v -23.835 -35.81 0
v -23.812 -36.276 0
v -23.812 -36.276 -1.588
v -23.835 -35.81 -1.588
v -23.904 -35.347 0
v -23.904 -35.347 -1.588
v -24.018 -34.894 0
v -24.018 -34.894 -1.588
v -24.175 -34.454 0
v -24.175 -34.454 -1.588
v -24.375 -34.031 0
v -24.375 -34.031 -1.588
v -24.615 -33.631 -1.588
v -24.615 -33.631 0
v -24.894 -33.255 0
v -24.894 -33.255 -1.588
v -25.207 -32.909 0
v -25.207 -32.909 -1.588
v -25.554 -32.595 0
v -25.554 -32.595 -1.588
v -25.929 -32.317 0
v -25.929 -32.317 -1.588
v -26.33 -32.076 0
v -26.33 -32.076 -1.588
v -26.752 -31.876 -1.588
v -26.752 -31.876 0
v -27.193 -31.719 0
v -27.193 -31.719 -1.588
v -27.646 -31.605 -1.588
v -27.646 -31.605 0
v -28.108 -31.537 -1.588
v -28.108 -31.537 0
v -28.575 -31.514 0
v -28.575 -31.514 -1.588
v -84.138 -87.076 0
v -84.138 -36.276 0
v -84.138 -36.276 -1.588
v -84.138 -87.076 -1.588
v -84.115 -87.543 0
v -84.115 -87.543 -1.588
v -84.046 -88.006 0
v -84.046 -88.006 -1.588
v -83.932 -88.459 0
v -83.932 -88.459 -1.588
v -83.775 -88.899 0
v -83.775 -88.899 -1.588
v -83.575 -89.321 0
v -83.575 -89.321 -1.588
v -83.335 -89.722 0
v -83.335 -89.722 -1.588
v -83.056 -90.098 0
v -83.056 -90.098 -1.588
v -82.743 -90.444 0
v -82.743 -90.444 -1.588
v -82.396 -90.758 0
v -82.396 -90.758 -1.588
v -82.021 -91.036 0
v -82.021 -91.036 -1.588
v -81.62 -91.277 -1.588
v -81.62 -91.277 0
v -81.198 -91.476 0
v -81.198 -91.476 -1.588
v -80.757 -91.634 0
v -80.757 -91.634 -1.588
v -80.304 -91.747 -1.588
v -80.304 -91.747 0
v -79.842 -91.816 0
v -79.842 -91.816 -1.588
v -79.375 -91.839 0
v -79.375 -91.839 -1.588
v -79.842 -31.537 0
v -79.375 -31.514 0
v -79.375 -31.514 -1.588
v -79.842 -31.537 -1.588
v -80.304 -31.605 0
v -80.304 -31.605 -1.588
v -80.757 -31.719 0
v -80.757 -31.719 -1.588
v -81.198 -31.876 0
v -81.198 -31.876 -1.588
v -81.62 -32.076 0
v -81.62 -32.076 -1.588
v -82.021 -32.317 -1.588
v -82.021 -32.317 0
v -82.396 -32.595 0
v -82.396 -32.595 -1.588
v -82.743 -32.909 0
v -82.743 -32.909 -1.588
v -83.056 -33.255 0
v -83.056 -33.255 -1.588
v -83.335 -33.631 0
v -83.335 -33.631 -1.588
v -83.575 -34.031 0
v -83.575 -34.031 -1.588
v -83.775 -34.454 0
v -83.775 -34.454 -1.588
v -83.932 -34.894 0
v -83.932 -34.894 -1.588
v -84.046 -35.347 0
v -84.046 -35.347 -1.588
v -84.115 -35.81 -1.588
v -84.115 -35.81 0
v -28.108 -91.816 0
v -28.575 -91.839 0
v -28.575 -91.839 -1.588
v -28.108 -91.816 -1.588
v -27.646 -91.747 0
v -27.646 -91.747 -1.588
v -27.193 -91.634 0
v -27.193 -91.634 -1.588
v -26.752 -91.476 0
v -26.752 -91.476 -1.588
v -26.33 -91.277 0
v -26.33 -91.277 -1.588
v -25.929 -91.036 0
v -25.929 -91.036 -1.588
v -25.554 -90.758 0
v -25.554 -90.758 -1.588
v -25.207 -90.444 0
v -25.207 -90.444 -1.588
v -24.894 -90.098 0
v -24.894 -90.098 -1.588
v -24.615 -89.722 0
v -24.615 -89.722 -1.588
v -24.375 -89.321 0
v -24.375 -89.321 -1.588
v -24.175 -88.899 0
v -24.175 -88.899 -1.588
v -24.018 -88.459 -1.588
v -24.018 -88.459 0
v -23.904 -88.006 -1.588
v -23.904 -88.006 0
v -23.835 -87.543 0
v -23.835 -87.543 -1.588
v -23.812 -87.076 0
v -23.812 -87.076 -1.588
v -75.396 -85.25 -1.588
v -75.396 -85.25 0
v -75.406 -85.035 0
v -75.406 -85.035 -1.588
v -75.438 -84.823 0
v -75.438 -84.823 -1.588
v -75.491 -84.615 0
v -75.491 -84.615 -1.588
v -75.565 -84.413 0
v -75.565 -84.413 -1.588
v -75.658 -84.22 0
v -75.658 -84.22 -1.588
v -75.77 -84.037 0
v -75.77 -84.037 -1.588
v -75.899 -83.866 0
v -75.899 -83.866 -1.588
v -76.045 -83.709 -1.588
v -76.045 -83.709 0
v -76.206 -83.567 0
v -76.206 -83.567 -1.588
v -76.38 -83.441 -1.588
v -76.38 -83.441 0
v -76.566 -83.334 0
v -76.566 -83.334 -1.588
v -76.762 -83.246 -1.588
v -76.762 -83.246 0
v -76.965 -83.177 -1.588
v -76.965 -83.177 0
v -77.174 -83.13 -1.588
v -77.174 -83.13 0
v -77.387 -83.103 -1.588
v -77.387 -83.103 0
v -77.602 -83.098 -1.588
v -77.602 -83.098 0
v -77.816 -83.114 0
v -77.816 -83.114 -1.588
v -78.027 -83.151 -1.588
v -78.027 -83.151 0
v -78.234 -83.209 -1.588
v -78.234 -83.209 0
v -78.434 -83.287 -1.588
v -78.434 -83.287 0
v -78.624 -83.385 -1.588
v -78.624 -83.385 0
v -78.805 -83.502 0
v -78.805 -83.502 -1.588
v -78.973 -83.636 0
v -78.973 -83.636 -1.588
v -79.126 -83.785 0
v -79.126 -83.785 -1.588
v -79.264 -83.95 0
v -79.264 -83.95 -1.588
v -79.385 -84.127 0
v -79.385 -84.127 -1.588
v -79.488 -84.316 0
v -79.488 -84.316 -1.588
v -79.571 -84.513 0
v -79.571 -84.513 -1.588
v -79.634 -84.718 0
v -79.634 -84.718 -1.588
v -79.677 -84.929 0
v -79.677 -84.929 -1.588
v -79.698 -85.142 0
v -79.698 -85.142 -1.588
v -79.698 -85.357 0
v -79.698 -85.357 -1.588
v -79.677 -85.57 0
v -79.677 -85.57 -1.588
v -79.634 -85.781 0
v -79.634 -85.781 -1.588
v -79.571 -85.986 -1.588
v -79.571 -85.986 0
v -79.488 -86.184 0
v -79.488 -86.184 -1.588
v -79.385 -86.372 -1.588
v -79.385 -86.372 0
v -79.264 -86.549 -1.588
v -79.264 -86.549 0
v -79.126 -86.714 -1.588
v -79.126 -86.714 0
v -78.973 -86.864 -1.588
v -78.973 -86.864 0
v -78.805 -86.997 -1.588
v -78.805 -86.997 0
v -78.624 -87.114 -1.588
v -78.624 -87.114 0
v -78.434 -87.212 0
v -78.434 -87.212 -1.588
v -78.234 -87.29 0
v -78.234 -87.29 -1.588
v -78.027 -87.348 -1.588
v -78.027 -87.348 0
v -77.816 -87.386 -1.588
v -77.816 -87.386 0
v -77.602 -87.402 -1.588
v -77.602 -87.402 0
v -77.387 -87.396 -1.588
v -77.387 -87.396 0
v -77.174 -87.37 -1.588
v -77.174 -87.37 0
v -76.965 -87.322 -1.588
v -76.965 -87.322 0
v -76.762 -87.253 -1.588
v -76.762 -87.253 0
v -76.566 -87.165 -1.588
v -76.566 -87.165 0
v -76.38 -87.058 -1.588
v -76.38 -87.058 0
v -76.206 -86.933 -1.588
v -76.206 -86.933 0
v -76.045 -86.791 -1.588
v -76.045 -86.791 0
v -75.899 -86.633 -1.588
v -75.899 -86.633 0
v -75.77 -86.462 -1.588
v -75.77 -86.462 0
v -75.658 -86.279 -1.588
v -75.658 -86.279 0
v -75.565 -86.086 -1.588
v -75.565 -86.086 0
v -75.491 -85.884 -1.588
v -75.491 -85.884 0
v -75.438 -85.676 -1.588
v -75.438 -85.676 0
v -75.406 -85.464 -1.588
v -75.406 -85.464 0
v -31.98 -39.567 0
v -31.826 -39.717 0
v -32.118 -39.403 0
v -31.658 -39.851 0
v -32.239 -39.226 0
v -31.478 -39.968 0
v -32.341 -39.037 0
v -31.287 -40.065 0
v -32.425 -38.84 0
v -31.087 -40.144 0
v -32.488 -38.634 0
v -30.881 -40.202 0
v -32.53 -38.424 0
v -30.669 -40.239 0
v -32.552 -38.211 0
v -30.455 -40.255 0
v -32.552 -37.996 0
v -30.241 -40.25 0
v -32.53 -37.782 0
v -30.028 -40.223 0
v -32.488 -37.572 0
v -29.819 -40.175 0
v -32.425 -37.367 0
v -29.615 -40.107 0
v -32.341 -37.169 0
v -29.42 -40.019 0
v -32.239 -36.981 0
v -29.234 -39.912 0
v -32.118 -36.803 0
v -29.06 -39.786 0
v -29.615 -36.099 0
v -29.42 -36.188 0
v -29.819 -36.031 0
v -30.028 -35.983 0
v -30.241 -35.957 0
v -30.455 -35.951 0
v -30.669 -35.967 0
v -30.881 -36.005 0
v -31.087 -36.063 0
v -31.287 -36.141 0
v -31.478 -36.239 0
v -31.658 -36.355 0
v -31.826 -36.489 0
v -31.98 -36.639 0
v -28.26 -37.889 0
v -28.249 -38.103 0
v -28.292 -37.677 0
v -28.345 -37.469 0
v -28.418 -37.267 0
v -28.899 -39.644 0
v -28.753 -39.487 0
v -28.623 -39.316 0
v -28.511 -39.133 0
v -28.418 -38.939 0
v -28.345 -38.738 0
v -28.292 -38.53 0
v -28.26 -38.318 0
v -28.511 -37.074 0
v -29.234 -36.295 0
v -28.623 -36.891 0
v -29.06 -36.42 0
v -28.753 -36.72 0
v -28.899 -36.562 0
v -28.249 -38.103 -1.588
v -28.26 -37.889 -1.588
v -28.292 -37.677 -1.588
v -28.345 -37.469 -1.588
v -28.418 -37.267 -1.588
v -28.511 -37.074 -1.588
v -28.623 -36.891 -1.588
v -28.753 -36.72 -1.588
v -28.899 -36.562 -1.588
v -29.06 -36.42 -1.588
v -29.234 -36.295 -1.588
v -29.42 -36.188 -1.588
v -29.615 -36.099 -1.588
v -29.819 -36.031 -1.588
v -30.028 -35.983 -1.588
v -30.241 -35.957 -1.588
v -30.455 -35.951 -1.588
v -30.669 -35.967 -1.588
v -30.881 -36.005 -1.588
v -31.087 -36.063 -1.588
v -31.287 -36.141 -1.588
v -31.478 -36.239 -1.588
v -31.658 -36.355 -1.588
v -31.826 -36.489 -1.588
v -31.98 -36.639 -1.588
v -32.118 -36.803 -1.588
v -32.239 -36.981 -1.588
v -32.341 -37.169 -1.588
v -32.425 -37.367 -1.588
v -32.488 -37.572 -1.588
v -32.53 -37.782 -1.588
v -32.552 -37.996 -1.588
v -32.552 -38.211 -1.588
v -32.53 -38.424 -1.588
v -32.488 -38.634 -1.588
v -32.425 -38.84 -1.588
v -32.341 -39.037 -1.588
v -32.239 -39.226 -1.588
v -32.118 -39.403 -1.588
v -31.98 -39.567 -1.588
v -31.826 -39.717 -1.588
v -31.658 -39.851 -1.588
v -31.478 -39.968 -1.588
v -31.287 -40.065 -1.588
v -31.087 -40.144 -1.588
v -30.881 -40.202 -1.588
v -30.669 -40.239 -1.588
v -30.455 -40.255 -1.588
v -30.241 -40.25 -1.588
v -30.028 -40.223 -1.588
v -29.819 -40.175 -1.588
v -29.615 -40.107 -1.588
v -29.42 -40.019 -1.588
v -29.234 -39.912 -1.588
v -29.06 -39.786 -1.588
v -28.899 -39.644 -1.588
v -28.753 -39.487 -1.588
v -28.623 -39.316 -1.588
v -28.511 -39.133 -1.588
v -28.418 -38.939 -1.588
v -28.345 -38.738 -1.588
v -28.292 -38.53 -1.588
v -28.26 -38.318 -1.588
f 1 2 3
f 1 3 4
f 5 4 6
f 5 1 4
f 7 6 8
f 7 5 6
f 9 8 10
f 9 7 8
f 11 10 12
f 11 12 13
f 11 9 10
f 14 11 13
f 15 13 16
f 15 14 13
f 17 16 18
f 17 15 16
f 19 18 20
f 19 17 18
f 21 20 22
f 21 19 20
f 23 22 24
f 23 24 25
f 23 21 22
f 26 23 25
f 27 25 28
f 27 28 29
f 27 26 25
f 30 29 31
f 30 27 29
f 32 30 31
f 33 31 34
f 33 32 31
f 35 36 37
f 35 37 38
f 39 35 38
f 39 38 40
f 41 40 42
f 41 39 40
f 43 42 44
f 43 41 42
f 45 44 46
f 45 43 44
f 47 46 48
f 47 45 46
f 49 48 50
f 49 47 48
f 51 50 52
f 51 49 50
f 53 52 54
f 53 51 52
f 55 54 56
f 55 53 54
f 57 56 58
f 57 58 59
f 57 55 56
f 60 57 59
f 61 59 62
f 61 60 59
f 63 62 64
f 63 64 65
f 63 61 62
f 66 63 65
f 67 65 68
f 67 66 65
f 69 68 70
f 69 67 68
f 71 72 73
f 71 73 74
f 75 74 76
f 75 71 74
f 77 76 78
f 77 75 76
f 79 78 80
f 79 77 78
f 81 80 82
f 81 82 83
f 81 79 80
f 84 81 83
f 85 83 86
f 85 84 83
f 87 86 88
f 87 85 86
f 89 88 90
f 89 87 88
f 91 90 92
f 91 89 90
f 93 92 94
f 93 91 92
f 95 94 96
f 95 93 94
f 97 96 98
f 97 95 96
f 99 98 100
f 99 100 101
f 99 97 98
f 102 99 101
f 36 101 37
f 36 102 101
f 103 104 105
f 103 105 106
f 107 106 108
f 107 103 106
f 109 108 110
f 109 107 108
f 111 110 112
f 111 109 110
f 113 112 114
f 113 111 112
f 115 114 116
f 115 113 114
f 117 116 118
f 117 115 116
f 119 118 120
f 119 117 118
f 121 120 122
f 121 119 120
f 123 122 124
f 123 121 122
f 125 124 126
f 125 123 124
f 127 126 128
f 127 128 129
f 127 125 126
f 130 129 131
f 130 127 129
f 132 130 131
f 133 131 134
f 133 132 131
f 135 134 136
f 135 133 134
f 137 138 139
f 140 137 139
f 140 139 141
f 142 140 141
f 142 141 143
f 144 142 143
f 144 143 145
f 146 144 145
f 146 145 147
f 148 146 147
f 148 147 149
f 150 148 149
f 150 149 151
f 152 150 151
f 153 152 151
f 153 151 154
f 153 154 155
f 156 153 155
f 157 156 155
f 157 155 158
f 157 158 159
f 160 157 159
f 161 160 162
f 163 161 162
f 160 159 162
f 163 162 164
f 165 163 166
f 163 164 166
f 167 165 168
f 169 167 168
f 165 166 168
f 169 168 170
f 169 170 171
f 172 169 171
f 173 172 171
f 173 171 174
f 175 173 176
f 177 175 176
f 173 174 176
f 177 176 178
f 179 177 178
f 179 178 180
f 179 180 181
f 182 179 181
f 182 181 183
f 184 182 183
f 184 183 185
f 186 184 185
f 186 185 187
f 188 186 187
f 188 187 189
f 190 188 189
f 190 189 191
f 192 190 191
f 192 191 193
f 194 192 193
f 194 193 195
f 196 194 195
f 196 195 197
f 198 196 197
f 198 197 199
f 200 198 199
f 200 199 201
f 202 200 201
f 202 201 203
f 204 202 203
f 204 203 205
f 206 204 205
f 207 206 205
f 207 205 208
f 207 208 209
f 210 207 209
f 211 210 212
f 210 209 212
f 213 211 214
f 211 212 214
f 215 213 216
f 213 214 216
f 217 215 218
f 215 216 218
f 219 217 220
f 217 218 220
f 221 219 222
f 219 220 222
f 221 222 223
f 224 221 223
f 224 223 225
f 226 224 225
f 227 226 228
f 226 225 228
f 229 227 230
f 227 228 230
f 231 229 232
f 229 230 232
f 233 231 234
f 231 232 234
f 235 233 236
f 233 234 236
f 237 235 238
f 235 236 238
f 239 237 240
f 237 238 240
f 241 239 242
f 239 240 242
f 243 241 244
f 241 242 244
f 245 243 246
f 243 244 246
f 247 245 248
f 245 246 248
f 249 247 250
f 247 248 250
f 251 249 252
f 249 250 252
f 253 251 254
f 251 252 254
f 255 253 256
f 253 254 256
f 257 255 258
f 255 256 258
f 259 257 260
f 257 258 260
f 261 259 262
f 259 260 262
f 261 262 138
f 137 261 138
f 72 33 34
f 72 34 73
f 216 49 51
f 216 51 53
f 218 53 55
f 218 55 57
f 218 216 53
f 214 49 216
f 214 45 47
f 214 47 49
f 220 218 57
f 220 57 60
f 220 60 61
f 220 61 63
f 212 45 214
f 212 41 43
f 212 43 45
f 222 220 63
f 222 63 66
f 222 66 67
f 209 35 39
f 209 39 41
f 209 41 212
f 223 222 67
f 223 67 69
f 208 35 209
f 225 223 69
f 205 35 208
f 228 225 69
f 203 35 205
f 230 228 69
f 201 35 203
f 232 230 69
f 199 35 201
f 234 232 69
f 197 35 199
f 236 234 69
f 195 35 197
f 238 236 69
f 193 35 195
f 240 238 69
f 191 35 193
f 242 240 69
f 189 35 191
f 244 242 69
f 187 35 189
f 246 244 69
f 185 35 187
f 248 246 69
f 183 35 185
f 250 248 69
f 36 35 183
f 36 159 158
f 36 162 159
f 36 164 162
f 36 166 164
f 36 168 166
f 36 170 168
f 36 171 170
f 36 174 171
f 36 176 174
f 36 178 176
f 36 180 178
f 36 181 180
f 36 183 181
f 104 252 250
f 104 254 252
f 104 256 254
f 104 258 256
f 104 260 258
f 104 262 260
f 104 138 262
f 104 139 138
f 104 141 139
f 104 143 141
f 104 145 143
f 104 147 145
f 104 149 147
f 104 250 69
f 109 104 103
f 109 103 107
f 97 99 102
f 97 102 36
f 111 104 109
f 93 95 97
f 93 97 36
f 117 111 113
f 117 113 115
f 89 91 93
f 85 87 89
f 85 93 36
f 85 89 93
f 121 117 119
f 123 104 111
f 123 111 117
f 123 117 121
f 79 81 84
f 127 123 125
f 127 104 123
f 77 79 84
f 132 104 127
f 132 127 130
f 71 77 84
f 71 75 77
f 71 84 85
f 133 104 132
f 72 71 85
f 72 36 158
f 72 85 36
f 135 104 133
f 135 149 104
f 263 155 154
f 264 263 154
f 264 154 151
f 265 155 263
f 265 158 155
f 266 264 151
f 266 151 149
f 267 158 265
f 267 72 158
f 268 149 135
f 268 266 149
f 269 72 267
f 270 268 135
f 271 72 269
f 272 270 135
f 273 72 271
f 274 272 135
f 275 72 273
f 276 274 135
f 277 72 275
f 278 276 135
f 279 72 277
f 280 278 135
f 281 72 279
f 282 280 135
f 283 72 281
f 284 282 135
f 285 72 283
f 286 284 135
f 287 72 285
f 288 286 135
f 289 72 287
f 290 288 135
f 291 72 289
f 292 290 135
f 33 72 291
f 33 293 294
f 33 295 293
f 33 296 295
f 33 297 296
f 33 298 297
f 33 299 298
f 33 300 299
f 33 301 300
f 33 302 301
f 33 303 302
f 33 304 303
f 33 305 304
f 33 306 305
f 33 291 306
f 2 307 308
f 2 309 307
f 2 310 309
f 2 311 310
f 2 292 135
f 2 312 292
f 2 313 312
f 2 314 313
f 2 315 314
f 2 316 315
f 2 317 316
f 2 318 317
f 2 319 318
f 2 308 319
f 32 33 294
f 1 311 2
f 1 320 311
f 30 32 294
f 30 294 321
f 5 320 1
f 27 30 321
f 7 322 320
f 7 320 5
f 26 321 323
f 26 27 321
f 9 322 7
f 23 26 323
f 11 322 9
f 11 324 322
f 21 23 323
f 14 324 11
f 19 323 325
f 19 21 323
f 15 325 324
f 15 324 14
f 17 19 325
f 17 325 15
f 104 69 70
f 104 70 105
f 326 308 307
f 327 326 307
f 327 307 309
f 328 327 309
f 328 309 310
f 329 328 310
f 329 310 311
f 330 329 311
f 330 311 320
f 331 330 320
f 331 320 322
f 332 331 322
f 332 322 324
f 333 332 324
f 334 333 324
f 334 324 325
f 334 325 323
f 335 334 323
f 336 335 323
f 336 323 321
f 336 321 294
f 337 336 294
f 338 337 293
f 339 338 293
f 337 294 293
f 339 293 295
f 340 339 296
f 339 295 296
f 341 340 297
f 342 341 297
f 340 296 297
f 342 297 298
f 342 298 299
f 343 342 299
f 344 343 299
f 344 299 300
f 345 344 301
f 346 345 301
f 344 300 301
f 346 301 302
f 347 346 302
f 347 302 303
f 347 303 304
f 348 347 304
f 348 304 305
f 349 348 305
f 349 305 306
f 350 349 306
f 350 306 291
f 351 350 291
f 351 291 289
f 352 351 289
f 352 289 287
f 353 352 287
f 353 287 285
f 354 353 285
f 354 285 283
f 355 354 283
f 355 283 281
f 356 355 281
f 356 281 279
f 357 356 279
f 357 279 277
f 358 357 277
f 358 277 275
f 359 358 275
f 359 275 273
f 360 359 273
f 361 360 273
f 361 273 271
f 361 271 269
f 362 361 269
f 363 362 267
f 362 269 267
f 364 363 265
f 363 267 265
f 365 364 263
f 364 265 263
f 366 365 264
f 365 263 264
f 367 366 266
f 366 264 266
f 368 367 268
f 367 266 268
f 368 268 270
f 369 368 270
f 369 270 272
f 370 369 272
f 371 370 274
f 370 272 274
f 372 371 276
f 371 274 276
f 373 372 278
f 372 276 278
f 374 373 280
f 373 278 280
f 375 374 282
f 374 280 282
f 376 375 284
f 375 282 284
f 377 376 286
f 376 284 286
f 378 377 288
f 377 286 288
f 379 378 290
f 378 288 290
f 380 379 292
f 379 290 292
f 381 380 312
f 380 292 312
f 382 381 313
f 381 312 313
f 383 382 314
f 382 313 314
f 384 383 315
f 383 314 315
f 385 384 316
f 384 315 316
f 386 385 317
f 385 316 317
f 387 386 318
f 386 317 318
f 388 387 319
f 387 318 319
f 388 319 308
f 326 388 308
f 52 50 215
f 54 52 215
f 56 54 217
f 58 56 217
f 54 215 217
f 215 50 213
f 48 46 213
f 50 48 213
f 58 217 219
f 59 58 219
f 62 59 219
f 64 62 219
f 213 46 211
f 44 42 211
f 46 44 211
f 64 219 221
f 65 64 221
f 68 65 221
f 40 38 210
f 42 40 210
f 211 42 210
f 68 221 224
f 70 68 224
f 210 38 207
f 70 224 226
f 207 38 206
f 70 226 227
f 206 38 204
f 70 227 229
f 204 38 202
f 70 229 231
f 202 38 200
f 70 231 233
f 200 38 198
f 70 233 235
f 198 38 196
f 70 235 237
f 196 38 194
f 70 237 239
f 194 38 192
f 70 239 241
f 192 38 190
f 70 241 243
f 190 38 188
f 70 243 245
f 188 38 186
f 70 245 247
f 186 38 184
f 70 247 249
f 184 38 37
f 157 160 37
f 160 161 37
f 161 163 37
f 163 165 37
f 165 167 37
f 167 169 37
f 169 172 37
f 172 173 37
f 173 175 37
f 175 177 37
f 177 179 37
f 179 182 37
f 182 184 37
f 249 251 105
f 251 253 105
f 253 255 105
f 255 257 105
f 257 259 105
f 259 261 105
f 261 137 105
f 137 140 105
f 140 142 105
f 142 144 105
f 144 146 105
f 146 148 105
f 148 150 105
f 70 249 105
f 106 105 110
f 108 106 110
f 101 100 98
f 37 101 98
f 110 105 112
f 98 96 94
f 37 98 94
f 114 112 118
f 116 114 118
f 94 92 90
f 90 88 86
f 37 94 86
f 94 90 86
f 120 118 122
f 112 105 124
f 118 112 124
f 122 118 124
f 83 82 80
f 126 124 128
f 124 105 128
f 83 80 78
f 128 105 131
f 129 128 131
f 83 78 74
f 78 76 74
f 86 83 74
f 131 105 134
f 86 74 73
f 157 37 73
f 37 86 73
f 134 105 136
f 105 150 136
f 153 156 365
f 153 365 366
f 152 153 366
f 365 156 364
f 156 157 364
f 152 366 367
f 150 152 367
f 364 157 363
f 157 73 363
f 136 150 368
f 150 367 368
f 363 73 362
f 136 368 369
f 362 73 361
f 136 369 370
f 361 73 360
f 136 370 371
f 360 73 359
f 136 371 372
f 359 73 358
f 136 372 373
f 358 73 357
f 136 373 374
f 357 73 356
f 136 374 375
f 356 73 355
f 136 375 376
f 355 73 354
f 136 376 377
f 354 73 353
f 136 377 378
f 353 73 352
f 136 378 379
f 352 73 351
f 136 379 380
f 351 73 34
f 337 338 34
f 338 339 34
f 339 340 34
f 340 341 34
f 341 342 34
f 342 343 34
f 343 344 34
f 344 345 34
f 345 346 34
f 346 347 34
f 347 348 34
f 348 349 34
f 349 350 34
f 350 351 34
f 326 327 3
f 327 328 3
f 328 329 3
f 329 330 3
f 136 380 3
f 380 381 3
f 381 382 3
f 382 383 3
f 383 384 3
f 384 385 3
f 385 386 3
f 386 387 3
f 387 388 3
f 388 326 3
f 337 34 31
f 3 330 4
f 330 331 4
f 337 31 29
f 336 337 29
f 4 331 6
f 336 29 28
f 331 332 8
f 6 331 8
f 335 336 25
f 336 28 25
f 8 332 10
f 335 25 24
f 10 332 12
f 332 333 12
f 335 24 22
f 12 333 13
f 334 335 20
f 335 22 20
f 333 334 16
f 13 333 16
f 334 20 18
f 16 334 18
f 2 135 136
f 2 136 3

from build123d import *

# Parameters (mm, degrees)
BOSS_EXTRUDE1_DEPTH   = 1.5875
F_6_CLEARANCE_HOLE1_D = 4.3053


with BuildPart() as part:
    # Sketch1 → Boss-Extrude1 (new body)
    with BuildSketch(Plane.XY):
        with BuildLine():
            Line((-23.8125, -87.076434182), (-23.8125, -36.276434182))
            ThreePointArc((-23.8125, -36.276434182), (-25.207403955, -32.908838137), (-28.575, -31.513934182))
            Line((-28.575, -31.513934182), (-79.375, -31.513934182))
            ThreePointArc((-79.375, -31.513934182), (-82.742596045, -32.908838137), (-84.1375, -36.276434182))
            Line((-84.1375, -36.276434182), (-84.1375, -87.076434182))
            ThreePointArc((-84.1375, -87.076434182), (-82.742596045, -90.444030228), (-79.375, -91.838934182))
            Line((-79.375, -91.838934182), (-28.575, -91.838934182))
            ThreePointArc((-28.575, -91.838934182), (-25.207403955, -90.444030228), (-23.8125, -87.076434182))
        make_face()
    extrude(amount=-BOSS_EXTRUDE1_DEPTH)

    # #6 Clearance Hole1 (through all)
    with Locations(Plane(origin=(0, 0, -1.5875), x_dir=(-1, 0, 0), z_dir=(0, 0, -1))):
        with Locations((30.401827682, -38.103261864), (77.548172318, -85.2496065)):
            Hole(F_6_CLEARANCE_HOLE1_D / 2)


solid = part.part
